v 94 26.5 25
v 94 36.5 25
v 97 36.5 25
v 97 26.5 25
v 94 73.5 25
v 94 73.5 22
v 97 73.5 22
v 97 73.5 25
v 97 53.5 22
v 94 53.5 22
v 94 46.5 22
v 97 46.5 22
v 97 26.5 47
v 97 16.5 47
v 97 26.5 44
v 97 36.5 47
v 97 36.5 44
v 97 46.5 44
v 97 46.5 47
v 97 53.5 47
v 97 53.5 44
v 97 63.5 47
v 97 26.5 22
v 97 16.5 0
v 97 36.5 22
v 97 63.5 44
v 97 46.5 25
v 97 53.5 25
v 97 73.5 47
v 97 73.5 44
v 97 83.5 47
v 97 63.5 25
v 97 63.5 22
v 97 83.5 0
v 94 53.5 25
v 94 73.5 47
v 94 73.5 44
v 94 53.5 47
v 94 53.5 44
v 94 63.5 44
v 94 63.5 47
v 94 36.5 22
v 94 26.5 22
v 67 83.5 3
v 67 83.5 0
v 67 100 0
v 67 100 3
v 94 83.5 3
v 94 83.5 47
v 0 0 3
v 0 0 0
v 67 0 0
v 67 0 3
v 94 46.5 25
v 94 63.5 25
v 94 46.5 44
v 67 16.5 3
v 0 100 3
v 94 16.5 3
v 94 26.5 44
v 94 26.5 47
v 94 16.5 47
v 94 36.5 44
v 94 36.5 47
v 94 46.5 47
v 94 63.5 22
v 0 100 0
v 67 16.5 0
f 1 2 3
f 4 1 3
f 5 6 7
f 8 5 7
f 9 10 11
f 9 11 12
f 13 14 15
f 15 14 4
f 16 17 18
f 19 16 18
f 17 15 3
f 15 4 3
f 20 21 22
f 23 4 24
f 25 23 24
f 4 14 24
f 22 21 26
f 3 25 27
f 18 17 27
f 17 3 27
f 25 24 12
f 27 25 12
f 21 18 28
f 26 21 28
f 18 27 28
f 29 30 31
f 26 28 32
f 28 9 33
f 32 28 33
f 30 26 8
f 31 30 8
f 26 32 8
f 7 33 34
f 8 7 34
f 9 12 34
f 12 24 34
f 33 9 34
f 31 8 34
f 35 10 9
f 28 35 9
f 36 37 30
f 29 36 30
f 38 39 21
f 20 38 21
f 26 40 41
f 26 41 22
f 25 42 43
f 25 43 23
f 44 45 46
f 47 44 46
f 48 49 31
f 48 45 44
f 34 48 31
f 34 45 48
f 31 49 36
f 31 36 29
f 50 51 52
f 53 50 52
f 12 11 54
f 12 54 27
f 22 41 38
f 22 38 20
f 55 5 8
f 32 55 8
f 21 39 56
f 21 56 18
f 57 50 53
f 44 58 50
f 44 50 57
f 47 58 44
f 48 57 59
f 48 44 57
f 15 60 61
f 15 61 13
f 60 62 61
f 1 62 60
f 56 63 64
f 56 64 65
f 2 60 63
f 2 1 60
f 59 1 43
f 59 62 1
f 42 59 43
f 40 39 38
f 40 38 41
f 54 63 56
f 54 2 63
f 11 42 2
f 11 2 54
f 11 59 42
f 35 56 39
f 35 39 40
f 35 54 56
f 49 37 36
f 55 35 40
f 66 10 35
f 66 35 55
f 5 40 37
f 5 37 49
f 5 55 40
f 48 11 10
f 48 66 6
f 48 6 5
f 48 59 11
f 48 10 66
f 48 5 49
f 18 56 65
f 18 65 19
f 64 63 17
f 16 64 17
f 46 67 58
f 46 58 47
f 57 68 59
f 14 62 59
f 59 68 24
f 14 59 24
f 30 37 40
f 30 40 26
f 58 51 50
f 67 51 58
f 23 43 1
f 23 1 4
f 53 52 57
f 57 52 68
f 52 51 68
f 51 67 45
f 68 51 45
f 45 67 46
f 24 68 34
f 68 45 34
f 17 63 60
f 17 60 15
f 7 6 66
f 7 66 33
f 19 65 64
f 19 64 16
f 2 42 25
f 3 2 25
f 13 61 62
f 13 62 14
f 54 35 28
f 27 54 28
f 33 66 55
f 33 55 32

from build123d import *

# Parameters (mm, degrees)
BOX002_W     = 30
BOX002_H     = 16.5
BOX002_DEPTH = 11
BOX001_W     = 30
BOX001_H     = 16.5
BOX001_DEPTH = 3
BOX_W        = 97
BOX_H        = 100
BOX_DEPTH    = 3
BOX028_W     = 9
BOX028_H     = 10
BOX028_DEPTH = 3
BOX027_W     = 9
BOX027_H     = 7
BOX027_DEPTH = 3
BOX026_W     = 9
BOX026_H     = 10
BOX026_DEPTH = 3
BOX008_W     = 9
BOX008_H     = 10
BOX008_DEPTH = 3
BOX010_W     = 9
BOX010_H     = 7
BOX010_DEPTH = 3
BOX005_W     = 9
BOX005_H     = 10
BOX005_DEPTH = 3
BOX003_W     = 3
BOX003_H     = 67
BOX003_DEPTH = 47


with BuildPart() as agujeros_ruedas001:
    # Box002 → Box002 (new body)
    with BuildSketch(Plane(origin=(67, 83.5, -4), x_dir=(1, 0, 0), z_dir=(0, 0, 1))):
        with Locations((15, 8.25)):
            Rectangle(BOX002_W, BOX002_H)
    extrude(amount=BOX002_DEPTH)


with BuildPart() as agujeros_ruedas:
    # Box001 → Box001 (new body)
    with BuildSketch(Plane(origin=(67, 0, 0), x_dir=(1, 0, 0), z_dir=(0, 0, 1))):
        with Locations((15, 8.25)):
            Rectangle(BOX001_W, BOX001_H)
    extrude(amount=BOX001_DEPTH)


with BuildPart() as base_con_agujeros_rueda:
    # Box → Box (new body)
    with BuildSketch(Plane.XY):
        with Locations((48.5, 50)):
            Rectangle(BOX_W, BOX_H)
    extrude(amount=BOX_DEPTH)

    # Cut: cut agujeros ruedas
    add(agujeros_ruedas.part, mode=Mode.SUBTRACT)

    # Cut001: cut agujeros ruedas001
    add(agujeros_ruedas001.part, mode=Mode.SUBTRACT)


with BuildPart() as box028:
    # Box028 → Box028 (new body)
    with BuildSketch(Plane(origin=(94, 63.5, 22), x_dir=(1, 0, 0), z_dir=(0, 0, 1))):
        with Locations((4.5, 5)):
            Rectangle(BOX028_W, BOX028_H)
    extrude(amount=BOX028_DEPTH)


with BuildPart() as centro002:
    # Box027 → Box027 (new body)
    with BuildSketch(Plane(origin=(94, 46.5, 22), x_dir=(1, 0, 0), z_dir=(0, 0, 1))):
        with Locations((4.5, 3.5)):
            Rectangle(BOX027_W, BOX027_H)
    extrude(amount=BOX027_DEPTH)


with BuildPart() as box026:
    # Box026 → Box026 (new body)
    with BuildSketch(Plane(origin=(94, 26.5, 22), x_dir=(1, 0, 0), z_dir=(0, 0, 1))):
        with Locations((4.5, 5)):
            Rectangle(BOX026_W, BOX026_H)
    extrude(amount=BOX026_DEPTH)


with BuildPart() as box008:
    # Box008 → Box008 (new body)
    with BuildSketch(Plane(origin=(91, 63.5, 44), x_dir=(1, 0, 0), z_dir=(0, 0, 1))):
        with Locations((4.5, 5)):
            Rectangle(BOX008_W, BOX008_H)
    extrude(amount=BOX008_DEPTH)


with BuildPart() as centro:
    # Box010 → Box010 (new body)
    with BuildSketch(Plane(origin=(91, 46.5, 44), x_dir=(1, 0, 0), z_dir=(0, 0, 1))):
        with Locations((4.5, 3.5)):
            Rectangle(BOX010_W, BOX010_H)
    extrude(amount=BOX010_DEPTH)


with BuildPart() as box005:
    # Box005 → Box005 (new body)
    with BuildSketch(Plane(origin=(91, 26.5, 44), x_dir=(1, 0, 0), z_dir=(0, 0, 1))):
        with Locations((4.5, 5)):
            Rectangle(BOX005_W, BOX005_H)
    extrude(amount=BOX005_DEPTH)


with BuildPart() as base_mas_tapa_atras_acabado:
    # Box003 → Box003 (new body)
    with BuildSketch(Plane(origin=(94, 16.5, 0), x_dir=(1, 0, 0), z_dir=(0, 0, 1))):
        with Locations((1.5, 33.5)):
            Rectangle(BOX003_W, BOX003_H)
    extrude(amount=BOX003_DEPTH)

    # Cut002: cut Box005
    add(box005.part, mode=Mode.SUBTRACT)

    # Cut003: cut centro
    add(centro.part, mode=Mode.SUBTRACT)

    # Cut004: cut Box008
    add(box008.part, mode=Mode.SUBTRACT)

    # Cut015: cut Box026
    add(box026.part, mode=Mode.SUBTRACT)

    # Cut016: cut centro002
    add(centro002.part, mode=Mode.SUBTRACT)

    # Cut017: cut Box028
    add(box028.part, mode=Mode.SUBTRACT)

    # Fusion004: union base con agujeros rueda
    add(base_con_agujeros_rueda.part)


solid = base_mas_tapa_atras_acabado.part
